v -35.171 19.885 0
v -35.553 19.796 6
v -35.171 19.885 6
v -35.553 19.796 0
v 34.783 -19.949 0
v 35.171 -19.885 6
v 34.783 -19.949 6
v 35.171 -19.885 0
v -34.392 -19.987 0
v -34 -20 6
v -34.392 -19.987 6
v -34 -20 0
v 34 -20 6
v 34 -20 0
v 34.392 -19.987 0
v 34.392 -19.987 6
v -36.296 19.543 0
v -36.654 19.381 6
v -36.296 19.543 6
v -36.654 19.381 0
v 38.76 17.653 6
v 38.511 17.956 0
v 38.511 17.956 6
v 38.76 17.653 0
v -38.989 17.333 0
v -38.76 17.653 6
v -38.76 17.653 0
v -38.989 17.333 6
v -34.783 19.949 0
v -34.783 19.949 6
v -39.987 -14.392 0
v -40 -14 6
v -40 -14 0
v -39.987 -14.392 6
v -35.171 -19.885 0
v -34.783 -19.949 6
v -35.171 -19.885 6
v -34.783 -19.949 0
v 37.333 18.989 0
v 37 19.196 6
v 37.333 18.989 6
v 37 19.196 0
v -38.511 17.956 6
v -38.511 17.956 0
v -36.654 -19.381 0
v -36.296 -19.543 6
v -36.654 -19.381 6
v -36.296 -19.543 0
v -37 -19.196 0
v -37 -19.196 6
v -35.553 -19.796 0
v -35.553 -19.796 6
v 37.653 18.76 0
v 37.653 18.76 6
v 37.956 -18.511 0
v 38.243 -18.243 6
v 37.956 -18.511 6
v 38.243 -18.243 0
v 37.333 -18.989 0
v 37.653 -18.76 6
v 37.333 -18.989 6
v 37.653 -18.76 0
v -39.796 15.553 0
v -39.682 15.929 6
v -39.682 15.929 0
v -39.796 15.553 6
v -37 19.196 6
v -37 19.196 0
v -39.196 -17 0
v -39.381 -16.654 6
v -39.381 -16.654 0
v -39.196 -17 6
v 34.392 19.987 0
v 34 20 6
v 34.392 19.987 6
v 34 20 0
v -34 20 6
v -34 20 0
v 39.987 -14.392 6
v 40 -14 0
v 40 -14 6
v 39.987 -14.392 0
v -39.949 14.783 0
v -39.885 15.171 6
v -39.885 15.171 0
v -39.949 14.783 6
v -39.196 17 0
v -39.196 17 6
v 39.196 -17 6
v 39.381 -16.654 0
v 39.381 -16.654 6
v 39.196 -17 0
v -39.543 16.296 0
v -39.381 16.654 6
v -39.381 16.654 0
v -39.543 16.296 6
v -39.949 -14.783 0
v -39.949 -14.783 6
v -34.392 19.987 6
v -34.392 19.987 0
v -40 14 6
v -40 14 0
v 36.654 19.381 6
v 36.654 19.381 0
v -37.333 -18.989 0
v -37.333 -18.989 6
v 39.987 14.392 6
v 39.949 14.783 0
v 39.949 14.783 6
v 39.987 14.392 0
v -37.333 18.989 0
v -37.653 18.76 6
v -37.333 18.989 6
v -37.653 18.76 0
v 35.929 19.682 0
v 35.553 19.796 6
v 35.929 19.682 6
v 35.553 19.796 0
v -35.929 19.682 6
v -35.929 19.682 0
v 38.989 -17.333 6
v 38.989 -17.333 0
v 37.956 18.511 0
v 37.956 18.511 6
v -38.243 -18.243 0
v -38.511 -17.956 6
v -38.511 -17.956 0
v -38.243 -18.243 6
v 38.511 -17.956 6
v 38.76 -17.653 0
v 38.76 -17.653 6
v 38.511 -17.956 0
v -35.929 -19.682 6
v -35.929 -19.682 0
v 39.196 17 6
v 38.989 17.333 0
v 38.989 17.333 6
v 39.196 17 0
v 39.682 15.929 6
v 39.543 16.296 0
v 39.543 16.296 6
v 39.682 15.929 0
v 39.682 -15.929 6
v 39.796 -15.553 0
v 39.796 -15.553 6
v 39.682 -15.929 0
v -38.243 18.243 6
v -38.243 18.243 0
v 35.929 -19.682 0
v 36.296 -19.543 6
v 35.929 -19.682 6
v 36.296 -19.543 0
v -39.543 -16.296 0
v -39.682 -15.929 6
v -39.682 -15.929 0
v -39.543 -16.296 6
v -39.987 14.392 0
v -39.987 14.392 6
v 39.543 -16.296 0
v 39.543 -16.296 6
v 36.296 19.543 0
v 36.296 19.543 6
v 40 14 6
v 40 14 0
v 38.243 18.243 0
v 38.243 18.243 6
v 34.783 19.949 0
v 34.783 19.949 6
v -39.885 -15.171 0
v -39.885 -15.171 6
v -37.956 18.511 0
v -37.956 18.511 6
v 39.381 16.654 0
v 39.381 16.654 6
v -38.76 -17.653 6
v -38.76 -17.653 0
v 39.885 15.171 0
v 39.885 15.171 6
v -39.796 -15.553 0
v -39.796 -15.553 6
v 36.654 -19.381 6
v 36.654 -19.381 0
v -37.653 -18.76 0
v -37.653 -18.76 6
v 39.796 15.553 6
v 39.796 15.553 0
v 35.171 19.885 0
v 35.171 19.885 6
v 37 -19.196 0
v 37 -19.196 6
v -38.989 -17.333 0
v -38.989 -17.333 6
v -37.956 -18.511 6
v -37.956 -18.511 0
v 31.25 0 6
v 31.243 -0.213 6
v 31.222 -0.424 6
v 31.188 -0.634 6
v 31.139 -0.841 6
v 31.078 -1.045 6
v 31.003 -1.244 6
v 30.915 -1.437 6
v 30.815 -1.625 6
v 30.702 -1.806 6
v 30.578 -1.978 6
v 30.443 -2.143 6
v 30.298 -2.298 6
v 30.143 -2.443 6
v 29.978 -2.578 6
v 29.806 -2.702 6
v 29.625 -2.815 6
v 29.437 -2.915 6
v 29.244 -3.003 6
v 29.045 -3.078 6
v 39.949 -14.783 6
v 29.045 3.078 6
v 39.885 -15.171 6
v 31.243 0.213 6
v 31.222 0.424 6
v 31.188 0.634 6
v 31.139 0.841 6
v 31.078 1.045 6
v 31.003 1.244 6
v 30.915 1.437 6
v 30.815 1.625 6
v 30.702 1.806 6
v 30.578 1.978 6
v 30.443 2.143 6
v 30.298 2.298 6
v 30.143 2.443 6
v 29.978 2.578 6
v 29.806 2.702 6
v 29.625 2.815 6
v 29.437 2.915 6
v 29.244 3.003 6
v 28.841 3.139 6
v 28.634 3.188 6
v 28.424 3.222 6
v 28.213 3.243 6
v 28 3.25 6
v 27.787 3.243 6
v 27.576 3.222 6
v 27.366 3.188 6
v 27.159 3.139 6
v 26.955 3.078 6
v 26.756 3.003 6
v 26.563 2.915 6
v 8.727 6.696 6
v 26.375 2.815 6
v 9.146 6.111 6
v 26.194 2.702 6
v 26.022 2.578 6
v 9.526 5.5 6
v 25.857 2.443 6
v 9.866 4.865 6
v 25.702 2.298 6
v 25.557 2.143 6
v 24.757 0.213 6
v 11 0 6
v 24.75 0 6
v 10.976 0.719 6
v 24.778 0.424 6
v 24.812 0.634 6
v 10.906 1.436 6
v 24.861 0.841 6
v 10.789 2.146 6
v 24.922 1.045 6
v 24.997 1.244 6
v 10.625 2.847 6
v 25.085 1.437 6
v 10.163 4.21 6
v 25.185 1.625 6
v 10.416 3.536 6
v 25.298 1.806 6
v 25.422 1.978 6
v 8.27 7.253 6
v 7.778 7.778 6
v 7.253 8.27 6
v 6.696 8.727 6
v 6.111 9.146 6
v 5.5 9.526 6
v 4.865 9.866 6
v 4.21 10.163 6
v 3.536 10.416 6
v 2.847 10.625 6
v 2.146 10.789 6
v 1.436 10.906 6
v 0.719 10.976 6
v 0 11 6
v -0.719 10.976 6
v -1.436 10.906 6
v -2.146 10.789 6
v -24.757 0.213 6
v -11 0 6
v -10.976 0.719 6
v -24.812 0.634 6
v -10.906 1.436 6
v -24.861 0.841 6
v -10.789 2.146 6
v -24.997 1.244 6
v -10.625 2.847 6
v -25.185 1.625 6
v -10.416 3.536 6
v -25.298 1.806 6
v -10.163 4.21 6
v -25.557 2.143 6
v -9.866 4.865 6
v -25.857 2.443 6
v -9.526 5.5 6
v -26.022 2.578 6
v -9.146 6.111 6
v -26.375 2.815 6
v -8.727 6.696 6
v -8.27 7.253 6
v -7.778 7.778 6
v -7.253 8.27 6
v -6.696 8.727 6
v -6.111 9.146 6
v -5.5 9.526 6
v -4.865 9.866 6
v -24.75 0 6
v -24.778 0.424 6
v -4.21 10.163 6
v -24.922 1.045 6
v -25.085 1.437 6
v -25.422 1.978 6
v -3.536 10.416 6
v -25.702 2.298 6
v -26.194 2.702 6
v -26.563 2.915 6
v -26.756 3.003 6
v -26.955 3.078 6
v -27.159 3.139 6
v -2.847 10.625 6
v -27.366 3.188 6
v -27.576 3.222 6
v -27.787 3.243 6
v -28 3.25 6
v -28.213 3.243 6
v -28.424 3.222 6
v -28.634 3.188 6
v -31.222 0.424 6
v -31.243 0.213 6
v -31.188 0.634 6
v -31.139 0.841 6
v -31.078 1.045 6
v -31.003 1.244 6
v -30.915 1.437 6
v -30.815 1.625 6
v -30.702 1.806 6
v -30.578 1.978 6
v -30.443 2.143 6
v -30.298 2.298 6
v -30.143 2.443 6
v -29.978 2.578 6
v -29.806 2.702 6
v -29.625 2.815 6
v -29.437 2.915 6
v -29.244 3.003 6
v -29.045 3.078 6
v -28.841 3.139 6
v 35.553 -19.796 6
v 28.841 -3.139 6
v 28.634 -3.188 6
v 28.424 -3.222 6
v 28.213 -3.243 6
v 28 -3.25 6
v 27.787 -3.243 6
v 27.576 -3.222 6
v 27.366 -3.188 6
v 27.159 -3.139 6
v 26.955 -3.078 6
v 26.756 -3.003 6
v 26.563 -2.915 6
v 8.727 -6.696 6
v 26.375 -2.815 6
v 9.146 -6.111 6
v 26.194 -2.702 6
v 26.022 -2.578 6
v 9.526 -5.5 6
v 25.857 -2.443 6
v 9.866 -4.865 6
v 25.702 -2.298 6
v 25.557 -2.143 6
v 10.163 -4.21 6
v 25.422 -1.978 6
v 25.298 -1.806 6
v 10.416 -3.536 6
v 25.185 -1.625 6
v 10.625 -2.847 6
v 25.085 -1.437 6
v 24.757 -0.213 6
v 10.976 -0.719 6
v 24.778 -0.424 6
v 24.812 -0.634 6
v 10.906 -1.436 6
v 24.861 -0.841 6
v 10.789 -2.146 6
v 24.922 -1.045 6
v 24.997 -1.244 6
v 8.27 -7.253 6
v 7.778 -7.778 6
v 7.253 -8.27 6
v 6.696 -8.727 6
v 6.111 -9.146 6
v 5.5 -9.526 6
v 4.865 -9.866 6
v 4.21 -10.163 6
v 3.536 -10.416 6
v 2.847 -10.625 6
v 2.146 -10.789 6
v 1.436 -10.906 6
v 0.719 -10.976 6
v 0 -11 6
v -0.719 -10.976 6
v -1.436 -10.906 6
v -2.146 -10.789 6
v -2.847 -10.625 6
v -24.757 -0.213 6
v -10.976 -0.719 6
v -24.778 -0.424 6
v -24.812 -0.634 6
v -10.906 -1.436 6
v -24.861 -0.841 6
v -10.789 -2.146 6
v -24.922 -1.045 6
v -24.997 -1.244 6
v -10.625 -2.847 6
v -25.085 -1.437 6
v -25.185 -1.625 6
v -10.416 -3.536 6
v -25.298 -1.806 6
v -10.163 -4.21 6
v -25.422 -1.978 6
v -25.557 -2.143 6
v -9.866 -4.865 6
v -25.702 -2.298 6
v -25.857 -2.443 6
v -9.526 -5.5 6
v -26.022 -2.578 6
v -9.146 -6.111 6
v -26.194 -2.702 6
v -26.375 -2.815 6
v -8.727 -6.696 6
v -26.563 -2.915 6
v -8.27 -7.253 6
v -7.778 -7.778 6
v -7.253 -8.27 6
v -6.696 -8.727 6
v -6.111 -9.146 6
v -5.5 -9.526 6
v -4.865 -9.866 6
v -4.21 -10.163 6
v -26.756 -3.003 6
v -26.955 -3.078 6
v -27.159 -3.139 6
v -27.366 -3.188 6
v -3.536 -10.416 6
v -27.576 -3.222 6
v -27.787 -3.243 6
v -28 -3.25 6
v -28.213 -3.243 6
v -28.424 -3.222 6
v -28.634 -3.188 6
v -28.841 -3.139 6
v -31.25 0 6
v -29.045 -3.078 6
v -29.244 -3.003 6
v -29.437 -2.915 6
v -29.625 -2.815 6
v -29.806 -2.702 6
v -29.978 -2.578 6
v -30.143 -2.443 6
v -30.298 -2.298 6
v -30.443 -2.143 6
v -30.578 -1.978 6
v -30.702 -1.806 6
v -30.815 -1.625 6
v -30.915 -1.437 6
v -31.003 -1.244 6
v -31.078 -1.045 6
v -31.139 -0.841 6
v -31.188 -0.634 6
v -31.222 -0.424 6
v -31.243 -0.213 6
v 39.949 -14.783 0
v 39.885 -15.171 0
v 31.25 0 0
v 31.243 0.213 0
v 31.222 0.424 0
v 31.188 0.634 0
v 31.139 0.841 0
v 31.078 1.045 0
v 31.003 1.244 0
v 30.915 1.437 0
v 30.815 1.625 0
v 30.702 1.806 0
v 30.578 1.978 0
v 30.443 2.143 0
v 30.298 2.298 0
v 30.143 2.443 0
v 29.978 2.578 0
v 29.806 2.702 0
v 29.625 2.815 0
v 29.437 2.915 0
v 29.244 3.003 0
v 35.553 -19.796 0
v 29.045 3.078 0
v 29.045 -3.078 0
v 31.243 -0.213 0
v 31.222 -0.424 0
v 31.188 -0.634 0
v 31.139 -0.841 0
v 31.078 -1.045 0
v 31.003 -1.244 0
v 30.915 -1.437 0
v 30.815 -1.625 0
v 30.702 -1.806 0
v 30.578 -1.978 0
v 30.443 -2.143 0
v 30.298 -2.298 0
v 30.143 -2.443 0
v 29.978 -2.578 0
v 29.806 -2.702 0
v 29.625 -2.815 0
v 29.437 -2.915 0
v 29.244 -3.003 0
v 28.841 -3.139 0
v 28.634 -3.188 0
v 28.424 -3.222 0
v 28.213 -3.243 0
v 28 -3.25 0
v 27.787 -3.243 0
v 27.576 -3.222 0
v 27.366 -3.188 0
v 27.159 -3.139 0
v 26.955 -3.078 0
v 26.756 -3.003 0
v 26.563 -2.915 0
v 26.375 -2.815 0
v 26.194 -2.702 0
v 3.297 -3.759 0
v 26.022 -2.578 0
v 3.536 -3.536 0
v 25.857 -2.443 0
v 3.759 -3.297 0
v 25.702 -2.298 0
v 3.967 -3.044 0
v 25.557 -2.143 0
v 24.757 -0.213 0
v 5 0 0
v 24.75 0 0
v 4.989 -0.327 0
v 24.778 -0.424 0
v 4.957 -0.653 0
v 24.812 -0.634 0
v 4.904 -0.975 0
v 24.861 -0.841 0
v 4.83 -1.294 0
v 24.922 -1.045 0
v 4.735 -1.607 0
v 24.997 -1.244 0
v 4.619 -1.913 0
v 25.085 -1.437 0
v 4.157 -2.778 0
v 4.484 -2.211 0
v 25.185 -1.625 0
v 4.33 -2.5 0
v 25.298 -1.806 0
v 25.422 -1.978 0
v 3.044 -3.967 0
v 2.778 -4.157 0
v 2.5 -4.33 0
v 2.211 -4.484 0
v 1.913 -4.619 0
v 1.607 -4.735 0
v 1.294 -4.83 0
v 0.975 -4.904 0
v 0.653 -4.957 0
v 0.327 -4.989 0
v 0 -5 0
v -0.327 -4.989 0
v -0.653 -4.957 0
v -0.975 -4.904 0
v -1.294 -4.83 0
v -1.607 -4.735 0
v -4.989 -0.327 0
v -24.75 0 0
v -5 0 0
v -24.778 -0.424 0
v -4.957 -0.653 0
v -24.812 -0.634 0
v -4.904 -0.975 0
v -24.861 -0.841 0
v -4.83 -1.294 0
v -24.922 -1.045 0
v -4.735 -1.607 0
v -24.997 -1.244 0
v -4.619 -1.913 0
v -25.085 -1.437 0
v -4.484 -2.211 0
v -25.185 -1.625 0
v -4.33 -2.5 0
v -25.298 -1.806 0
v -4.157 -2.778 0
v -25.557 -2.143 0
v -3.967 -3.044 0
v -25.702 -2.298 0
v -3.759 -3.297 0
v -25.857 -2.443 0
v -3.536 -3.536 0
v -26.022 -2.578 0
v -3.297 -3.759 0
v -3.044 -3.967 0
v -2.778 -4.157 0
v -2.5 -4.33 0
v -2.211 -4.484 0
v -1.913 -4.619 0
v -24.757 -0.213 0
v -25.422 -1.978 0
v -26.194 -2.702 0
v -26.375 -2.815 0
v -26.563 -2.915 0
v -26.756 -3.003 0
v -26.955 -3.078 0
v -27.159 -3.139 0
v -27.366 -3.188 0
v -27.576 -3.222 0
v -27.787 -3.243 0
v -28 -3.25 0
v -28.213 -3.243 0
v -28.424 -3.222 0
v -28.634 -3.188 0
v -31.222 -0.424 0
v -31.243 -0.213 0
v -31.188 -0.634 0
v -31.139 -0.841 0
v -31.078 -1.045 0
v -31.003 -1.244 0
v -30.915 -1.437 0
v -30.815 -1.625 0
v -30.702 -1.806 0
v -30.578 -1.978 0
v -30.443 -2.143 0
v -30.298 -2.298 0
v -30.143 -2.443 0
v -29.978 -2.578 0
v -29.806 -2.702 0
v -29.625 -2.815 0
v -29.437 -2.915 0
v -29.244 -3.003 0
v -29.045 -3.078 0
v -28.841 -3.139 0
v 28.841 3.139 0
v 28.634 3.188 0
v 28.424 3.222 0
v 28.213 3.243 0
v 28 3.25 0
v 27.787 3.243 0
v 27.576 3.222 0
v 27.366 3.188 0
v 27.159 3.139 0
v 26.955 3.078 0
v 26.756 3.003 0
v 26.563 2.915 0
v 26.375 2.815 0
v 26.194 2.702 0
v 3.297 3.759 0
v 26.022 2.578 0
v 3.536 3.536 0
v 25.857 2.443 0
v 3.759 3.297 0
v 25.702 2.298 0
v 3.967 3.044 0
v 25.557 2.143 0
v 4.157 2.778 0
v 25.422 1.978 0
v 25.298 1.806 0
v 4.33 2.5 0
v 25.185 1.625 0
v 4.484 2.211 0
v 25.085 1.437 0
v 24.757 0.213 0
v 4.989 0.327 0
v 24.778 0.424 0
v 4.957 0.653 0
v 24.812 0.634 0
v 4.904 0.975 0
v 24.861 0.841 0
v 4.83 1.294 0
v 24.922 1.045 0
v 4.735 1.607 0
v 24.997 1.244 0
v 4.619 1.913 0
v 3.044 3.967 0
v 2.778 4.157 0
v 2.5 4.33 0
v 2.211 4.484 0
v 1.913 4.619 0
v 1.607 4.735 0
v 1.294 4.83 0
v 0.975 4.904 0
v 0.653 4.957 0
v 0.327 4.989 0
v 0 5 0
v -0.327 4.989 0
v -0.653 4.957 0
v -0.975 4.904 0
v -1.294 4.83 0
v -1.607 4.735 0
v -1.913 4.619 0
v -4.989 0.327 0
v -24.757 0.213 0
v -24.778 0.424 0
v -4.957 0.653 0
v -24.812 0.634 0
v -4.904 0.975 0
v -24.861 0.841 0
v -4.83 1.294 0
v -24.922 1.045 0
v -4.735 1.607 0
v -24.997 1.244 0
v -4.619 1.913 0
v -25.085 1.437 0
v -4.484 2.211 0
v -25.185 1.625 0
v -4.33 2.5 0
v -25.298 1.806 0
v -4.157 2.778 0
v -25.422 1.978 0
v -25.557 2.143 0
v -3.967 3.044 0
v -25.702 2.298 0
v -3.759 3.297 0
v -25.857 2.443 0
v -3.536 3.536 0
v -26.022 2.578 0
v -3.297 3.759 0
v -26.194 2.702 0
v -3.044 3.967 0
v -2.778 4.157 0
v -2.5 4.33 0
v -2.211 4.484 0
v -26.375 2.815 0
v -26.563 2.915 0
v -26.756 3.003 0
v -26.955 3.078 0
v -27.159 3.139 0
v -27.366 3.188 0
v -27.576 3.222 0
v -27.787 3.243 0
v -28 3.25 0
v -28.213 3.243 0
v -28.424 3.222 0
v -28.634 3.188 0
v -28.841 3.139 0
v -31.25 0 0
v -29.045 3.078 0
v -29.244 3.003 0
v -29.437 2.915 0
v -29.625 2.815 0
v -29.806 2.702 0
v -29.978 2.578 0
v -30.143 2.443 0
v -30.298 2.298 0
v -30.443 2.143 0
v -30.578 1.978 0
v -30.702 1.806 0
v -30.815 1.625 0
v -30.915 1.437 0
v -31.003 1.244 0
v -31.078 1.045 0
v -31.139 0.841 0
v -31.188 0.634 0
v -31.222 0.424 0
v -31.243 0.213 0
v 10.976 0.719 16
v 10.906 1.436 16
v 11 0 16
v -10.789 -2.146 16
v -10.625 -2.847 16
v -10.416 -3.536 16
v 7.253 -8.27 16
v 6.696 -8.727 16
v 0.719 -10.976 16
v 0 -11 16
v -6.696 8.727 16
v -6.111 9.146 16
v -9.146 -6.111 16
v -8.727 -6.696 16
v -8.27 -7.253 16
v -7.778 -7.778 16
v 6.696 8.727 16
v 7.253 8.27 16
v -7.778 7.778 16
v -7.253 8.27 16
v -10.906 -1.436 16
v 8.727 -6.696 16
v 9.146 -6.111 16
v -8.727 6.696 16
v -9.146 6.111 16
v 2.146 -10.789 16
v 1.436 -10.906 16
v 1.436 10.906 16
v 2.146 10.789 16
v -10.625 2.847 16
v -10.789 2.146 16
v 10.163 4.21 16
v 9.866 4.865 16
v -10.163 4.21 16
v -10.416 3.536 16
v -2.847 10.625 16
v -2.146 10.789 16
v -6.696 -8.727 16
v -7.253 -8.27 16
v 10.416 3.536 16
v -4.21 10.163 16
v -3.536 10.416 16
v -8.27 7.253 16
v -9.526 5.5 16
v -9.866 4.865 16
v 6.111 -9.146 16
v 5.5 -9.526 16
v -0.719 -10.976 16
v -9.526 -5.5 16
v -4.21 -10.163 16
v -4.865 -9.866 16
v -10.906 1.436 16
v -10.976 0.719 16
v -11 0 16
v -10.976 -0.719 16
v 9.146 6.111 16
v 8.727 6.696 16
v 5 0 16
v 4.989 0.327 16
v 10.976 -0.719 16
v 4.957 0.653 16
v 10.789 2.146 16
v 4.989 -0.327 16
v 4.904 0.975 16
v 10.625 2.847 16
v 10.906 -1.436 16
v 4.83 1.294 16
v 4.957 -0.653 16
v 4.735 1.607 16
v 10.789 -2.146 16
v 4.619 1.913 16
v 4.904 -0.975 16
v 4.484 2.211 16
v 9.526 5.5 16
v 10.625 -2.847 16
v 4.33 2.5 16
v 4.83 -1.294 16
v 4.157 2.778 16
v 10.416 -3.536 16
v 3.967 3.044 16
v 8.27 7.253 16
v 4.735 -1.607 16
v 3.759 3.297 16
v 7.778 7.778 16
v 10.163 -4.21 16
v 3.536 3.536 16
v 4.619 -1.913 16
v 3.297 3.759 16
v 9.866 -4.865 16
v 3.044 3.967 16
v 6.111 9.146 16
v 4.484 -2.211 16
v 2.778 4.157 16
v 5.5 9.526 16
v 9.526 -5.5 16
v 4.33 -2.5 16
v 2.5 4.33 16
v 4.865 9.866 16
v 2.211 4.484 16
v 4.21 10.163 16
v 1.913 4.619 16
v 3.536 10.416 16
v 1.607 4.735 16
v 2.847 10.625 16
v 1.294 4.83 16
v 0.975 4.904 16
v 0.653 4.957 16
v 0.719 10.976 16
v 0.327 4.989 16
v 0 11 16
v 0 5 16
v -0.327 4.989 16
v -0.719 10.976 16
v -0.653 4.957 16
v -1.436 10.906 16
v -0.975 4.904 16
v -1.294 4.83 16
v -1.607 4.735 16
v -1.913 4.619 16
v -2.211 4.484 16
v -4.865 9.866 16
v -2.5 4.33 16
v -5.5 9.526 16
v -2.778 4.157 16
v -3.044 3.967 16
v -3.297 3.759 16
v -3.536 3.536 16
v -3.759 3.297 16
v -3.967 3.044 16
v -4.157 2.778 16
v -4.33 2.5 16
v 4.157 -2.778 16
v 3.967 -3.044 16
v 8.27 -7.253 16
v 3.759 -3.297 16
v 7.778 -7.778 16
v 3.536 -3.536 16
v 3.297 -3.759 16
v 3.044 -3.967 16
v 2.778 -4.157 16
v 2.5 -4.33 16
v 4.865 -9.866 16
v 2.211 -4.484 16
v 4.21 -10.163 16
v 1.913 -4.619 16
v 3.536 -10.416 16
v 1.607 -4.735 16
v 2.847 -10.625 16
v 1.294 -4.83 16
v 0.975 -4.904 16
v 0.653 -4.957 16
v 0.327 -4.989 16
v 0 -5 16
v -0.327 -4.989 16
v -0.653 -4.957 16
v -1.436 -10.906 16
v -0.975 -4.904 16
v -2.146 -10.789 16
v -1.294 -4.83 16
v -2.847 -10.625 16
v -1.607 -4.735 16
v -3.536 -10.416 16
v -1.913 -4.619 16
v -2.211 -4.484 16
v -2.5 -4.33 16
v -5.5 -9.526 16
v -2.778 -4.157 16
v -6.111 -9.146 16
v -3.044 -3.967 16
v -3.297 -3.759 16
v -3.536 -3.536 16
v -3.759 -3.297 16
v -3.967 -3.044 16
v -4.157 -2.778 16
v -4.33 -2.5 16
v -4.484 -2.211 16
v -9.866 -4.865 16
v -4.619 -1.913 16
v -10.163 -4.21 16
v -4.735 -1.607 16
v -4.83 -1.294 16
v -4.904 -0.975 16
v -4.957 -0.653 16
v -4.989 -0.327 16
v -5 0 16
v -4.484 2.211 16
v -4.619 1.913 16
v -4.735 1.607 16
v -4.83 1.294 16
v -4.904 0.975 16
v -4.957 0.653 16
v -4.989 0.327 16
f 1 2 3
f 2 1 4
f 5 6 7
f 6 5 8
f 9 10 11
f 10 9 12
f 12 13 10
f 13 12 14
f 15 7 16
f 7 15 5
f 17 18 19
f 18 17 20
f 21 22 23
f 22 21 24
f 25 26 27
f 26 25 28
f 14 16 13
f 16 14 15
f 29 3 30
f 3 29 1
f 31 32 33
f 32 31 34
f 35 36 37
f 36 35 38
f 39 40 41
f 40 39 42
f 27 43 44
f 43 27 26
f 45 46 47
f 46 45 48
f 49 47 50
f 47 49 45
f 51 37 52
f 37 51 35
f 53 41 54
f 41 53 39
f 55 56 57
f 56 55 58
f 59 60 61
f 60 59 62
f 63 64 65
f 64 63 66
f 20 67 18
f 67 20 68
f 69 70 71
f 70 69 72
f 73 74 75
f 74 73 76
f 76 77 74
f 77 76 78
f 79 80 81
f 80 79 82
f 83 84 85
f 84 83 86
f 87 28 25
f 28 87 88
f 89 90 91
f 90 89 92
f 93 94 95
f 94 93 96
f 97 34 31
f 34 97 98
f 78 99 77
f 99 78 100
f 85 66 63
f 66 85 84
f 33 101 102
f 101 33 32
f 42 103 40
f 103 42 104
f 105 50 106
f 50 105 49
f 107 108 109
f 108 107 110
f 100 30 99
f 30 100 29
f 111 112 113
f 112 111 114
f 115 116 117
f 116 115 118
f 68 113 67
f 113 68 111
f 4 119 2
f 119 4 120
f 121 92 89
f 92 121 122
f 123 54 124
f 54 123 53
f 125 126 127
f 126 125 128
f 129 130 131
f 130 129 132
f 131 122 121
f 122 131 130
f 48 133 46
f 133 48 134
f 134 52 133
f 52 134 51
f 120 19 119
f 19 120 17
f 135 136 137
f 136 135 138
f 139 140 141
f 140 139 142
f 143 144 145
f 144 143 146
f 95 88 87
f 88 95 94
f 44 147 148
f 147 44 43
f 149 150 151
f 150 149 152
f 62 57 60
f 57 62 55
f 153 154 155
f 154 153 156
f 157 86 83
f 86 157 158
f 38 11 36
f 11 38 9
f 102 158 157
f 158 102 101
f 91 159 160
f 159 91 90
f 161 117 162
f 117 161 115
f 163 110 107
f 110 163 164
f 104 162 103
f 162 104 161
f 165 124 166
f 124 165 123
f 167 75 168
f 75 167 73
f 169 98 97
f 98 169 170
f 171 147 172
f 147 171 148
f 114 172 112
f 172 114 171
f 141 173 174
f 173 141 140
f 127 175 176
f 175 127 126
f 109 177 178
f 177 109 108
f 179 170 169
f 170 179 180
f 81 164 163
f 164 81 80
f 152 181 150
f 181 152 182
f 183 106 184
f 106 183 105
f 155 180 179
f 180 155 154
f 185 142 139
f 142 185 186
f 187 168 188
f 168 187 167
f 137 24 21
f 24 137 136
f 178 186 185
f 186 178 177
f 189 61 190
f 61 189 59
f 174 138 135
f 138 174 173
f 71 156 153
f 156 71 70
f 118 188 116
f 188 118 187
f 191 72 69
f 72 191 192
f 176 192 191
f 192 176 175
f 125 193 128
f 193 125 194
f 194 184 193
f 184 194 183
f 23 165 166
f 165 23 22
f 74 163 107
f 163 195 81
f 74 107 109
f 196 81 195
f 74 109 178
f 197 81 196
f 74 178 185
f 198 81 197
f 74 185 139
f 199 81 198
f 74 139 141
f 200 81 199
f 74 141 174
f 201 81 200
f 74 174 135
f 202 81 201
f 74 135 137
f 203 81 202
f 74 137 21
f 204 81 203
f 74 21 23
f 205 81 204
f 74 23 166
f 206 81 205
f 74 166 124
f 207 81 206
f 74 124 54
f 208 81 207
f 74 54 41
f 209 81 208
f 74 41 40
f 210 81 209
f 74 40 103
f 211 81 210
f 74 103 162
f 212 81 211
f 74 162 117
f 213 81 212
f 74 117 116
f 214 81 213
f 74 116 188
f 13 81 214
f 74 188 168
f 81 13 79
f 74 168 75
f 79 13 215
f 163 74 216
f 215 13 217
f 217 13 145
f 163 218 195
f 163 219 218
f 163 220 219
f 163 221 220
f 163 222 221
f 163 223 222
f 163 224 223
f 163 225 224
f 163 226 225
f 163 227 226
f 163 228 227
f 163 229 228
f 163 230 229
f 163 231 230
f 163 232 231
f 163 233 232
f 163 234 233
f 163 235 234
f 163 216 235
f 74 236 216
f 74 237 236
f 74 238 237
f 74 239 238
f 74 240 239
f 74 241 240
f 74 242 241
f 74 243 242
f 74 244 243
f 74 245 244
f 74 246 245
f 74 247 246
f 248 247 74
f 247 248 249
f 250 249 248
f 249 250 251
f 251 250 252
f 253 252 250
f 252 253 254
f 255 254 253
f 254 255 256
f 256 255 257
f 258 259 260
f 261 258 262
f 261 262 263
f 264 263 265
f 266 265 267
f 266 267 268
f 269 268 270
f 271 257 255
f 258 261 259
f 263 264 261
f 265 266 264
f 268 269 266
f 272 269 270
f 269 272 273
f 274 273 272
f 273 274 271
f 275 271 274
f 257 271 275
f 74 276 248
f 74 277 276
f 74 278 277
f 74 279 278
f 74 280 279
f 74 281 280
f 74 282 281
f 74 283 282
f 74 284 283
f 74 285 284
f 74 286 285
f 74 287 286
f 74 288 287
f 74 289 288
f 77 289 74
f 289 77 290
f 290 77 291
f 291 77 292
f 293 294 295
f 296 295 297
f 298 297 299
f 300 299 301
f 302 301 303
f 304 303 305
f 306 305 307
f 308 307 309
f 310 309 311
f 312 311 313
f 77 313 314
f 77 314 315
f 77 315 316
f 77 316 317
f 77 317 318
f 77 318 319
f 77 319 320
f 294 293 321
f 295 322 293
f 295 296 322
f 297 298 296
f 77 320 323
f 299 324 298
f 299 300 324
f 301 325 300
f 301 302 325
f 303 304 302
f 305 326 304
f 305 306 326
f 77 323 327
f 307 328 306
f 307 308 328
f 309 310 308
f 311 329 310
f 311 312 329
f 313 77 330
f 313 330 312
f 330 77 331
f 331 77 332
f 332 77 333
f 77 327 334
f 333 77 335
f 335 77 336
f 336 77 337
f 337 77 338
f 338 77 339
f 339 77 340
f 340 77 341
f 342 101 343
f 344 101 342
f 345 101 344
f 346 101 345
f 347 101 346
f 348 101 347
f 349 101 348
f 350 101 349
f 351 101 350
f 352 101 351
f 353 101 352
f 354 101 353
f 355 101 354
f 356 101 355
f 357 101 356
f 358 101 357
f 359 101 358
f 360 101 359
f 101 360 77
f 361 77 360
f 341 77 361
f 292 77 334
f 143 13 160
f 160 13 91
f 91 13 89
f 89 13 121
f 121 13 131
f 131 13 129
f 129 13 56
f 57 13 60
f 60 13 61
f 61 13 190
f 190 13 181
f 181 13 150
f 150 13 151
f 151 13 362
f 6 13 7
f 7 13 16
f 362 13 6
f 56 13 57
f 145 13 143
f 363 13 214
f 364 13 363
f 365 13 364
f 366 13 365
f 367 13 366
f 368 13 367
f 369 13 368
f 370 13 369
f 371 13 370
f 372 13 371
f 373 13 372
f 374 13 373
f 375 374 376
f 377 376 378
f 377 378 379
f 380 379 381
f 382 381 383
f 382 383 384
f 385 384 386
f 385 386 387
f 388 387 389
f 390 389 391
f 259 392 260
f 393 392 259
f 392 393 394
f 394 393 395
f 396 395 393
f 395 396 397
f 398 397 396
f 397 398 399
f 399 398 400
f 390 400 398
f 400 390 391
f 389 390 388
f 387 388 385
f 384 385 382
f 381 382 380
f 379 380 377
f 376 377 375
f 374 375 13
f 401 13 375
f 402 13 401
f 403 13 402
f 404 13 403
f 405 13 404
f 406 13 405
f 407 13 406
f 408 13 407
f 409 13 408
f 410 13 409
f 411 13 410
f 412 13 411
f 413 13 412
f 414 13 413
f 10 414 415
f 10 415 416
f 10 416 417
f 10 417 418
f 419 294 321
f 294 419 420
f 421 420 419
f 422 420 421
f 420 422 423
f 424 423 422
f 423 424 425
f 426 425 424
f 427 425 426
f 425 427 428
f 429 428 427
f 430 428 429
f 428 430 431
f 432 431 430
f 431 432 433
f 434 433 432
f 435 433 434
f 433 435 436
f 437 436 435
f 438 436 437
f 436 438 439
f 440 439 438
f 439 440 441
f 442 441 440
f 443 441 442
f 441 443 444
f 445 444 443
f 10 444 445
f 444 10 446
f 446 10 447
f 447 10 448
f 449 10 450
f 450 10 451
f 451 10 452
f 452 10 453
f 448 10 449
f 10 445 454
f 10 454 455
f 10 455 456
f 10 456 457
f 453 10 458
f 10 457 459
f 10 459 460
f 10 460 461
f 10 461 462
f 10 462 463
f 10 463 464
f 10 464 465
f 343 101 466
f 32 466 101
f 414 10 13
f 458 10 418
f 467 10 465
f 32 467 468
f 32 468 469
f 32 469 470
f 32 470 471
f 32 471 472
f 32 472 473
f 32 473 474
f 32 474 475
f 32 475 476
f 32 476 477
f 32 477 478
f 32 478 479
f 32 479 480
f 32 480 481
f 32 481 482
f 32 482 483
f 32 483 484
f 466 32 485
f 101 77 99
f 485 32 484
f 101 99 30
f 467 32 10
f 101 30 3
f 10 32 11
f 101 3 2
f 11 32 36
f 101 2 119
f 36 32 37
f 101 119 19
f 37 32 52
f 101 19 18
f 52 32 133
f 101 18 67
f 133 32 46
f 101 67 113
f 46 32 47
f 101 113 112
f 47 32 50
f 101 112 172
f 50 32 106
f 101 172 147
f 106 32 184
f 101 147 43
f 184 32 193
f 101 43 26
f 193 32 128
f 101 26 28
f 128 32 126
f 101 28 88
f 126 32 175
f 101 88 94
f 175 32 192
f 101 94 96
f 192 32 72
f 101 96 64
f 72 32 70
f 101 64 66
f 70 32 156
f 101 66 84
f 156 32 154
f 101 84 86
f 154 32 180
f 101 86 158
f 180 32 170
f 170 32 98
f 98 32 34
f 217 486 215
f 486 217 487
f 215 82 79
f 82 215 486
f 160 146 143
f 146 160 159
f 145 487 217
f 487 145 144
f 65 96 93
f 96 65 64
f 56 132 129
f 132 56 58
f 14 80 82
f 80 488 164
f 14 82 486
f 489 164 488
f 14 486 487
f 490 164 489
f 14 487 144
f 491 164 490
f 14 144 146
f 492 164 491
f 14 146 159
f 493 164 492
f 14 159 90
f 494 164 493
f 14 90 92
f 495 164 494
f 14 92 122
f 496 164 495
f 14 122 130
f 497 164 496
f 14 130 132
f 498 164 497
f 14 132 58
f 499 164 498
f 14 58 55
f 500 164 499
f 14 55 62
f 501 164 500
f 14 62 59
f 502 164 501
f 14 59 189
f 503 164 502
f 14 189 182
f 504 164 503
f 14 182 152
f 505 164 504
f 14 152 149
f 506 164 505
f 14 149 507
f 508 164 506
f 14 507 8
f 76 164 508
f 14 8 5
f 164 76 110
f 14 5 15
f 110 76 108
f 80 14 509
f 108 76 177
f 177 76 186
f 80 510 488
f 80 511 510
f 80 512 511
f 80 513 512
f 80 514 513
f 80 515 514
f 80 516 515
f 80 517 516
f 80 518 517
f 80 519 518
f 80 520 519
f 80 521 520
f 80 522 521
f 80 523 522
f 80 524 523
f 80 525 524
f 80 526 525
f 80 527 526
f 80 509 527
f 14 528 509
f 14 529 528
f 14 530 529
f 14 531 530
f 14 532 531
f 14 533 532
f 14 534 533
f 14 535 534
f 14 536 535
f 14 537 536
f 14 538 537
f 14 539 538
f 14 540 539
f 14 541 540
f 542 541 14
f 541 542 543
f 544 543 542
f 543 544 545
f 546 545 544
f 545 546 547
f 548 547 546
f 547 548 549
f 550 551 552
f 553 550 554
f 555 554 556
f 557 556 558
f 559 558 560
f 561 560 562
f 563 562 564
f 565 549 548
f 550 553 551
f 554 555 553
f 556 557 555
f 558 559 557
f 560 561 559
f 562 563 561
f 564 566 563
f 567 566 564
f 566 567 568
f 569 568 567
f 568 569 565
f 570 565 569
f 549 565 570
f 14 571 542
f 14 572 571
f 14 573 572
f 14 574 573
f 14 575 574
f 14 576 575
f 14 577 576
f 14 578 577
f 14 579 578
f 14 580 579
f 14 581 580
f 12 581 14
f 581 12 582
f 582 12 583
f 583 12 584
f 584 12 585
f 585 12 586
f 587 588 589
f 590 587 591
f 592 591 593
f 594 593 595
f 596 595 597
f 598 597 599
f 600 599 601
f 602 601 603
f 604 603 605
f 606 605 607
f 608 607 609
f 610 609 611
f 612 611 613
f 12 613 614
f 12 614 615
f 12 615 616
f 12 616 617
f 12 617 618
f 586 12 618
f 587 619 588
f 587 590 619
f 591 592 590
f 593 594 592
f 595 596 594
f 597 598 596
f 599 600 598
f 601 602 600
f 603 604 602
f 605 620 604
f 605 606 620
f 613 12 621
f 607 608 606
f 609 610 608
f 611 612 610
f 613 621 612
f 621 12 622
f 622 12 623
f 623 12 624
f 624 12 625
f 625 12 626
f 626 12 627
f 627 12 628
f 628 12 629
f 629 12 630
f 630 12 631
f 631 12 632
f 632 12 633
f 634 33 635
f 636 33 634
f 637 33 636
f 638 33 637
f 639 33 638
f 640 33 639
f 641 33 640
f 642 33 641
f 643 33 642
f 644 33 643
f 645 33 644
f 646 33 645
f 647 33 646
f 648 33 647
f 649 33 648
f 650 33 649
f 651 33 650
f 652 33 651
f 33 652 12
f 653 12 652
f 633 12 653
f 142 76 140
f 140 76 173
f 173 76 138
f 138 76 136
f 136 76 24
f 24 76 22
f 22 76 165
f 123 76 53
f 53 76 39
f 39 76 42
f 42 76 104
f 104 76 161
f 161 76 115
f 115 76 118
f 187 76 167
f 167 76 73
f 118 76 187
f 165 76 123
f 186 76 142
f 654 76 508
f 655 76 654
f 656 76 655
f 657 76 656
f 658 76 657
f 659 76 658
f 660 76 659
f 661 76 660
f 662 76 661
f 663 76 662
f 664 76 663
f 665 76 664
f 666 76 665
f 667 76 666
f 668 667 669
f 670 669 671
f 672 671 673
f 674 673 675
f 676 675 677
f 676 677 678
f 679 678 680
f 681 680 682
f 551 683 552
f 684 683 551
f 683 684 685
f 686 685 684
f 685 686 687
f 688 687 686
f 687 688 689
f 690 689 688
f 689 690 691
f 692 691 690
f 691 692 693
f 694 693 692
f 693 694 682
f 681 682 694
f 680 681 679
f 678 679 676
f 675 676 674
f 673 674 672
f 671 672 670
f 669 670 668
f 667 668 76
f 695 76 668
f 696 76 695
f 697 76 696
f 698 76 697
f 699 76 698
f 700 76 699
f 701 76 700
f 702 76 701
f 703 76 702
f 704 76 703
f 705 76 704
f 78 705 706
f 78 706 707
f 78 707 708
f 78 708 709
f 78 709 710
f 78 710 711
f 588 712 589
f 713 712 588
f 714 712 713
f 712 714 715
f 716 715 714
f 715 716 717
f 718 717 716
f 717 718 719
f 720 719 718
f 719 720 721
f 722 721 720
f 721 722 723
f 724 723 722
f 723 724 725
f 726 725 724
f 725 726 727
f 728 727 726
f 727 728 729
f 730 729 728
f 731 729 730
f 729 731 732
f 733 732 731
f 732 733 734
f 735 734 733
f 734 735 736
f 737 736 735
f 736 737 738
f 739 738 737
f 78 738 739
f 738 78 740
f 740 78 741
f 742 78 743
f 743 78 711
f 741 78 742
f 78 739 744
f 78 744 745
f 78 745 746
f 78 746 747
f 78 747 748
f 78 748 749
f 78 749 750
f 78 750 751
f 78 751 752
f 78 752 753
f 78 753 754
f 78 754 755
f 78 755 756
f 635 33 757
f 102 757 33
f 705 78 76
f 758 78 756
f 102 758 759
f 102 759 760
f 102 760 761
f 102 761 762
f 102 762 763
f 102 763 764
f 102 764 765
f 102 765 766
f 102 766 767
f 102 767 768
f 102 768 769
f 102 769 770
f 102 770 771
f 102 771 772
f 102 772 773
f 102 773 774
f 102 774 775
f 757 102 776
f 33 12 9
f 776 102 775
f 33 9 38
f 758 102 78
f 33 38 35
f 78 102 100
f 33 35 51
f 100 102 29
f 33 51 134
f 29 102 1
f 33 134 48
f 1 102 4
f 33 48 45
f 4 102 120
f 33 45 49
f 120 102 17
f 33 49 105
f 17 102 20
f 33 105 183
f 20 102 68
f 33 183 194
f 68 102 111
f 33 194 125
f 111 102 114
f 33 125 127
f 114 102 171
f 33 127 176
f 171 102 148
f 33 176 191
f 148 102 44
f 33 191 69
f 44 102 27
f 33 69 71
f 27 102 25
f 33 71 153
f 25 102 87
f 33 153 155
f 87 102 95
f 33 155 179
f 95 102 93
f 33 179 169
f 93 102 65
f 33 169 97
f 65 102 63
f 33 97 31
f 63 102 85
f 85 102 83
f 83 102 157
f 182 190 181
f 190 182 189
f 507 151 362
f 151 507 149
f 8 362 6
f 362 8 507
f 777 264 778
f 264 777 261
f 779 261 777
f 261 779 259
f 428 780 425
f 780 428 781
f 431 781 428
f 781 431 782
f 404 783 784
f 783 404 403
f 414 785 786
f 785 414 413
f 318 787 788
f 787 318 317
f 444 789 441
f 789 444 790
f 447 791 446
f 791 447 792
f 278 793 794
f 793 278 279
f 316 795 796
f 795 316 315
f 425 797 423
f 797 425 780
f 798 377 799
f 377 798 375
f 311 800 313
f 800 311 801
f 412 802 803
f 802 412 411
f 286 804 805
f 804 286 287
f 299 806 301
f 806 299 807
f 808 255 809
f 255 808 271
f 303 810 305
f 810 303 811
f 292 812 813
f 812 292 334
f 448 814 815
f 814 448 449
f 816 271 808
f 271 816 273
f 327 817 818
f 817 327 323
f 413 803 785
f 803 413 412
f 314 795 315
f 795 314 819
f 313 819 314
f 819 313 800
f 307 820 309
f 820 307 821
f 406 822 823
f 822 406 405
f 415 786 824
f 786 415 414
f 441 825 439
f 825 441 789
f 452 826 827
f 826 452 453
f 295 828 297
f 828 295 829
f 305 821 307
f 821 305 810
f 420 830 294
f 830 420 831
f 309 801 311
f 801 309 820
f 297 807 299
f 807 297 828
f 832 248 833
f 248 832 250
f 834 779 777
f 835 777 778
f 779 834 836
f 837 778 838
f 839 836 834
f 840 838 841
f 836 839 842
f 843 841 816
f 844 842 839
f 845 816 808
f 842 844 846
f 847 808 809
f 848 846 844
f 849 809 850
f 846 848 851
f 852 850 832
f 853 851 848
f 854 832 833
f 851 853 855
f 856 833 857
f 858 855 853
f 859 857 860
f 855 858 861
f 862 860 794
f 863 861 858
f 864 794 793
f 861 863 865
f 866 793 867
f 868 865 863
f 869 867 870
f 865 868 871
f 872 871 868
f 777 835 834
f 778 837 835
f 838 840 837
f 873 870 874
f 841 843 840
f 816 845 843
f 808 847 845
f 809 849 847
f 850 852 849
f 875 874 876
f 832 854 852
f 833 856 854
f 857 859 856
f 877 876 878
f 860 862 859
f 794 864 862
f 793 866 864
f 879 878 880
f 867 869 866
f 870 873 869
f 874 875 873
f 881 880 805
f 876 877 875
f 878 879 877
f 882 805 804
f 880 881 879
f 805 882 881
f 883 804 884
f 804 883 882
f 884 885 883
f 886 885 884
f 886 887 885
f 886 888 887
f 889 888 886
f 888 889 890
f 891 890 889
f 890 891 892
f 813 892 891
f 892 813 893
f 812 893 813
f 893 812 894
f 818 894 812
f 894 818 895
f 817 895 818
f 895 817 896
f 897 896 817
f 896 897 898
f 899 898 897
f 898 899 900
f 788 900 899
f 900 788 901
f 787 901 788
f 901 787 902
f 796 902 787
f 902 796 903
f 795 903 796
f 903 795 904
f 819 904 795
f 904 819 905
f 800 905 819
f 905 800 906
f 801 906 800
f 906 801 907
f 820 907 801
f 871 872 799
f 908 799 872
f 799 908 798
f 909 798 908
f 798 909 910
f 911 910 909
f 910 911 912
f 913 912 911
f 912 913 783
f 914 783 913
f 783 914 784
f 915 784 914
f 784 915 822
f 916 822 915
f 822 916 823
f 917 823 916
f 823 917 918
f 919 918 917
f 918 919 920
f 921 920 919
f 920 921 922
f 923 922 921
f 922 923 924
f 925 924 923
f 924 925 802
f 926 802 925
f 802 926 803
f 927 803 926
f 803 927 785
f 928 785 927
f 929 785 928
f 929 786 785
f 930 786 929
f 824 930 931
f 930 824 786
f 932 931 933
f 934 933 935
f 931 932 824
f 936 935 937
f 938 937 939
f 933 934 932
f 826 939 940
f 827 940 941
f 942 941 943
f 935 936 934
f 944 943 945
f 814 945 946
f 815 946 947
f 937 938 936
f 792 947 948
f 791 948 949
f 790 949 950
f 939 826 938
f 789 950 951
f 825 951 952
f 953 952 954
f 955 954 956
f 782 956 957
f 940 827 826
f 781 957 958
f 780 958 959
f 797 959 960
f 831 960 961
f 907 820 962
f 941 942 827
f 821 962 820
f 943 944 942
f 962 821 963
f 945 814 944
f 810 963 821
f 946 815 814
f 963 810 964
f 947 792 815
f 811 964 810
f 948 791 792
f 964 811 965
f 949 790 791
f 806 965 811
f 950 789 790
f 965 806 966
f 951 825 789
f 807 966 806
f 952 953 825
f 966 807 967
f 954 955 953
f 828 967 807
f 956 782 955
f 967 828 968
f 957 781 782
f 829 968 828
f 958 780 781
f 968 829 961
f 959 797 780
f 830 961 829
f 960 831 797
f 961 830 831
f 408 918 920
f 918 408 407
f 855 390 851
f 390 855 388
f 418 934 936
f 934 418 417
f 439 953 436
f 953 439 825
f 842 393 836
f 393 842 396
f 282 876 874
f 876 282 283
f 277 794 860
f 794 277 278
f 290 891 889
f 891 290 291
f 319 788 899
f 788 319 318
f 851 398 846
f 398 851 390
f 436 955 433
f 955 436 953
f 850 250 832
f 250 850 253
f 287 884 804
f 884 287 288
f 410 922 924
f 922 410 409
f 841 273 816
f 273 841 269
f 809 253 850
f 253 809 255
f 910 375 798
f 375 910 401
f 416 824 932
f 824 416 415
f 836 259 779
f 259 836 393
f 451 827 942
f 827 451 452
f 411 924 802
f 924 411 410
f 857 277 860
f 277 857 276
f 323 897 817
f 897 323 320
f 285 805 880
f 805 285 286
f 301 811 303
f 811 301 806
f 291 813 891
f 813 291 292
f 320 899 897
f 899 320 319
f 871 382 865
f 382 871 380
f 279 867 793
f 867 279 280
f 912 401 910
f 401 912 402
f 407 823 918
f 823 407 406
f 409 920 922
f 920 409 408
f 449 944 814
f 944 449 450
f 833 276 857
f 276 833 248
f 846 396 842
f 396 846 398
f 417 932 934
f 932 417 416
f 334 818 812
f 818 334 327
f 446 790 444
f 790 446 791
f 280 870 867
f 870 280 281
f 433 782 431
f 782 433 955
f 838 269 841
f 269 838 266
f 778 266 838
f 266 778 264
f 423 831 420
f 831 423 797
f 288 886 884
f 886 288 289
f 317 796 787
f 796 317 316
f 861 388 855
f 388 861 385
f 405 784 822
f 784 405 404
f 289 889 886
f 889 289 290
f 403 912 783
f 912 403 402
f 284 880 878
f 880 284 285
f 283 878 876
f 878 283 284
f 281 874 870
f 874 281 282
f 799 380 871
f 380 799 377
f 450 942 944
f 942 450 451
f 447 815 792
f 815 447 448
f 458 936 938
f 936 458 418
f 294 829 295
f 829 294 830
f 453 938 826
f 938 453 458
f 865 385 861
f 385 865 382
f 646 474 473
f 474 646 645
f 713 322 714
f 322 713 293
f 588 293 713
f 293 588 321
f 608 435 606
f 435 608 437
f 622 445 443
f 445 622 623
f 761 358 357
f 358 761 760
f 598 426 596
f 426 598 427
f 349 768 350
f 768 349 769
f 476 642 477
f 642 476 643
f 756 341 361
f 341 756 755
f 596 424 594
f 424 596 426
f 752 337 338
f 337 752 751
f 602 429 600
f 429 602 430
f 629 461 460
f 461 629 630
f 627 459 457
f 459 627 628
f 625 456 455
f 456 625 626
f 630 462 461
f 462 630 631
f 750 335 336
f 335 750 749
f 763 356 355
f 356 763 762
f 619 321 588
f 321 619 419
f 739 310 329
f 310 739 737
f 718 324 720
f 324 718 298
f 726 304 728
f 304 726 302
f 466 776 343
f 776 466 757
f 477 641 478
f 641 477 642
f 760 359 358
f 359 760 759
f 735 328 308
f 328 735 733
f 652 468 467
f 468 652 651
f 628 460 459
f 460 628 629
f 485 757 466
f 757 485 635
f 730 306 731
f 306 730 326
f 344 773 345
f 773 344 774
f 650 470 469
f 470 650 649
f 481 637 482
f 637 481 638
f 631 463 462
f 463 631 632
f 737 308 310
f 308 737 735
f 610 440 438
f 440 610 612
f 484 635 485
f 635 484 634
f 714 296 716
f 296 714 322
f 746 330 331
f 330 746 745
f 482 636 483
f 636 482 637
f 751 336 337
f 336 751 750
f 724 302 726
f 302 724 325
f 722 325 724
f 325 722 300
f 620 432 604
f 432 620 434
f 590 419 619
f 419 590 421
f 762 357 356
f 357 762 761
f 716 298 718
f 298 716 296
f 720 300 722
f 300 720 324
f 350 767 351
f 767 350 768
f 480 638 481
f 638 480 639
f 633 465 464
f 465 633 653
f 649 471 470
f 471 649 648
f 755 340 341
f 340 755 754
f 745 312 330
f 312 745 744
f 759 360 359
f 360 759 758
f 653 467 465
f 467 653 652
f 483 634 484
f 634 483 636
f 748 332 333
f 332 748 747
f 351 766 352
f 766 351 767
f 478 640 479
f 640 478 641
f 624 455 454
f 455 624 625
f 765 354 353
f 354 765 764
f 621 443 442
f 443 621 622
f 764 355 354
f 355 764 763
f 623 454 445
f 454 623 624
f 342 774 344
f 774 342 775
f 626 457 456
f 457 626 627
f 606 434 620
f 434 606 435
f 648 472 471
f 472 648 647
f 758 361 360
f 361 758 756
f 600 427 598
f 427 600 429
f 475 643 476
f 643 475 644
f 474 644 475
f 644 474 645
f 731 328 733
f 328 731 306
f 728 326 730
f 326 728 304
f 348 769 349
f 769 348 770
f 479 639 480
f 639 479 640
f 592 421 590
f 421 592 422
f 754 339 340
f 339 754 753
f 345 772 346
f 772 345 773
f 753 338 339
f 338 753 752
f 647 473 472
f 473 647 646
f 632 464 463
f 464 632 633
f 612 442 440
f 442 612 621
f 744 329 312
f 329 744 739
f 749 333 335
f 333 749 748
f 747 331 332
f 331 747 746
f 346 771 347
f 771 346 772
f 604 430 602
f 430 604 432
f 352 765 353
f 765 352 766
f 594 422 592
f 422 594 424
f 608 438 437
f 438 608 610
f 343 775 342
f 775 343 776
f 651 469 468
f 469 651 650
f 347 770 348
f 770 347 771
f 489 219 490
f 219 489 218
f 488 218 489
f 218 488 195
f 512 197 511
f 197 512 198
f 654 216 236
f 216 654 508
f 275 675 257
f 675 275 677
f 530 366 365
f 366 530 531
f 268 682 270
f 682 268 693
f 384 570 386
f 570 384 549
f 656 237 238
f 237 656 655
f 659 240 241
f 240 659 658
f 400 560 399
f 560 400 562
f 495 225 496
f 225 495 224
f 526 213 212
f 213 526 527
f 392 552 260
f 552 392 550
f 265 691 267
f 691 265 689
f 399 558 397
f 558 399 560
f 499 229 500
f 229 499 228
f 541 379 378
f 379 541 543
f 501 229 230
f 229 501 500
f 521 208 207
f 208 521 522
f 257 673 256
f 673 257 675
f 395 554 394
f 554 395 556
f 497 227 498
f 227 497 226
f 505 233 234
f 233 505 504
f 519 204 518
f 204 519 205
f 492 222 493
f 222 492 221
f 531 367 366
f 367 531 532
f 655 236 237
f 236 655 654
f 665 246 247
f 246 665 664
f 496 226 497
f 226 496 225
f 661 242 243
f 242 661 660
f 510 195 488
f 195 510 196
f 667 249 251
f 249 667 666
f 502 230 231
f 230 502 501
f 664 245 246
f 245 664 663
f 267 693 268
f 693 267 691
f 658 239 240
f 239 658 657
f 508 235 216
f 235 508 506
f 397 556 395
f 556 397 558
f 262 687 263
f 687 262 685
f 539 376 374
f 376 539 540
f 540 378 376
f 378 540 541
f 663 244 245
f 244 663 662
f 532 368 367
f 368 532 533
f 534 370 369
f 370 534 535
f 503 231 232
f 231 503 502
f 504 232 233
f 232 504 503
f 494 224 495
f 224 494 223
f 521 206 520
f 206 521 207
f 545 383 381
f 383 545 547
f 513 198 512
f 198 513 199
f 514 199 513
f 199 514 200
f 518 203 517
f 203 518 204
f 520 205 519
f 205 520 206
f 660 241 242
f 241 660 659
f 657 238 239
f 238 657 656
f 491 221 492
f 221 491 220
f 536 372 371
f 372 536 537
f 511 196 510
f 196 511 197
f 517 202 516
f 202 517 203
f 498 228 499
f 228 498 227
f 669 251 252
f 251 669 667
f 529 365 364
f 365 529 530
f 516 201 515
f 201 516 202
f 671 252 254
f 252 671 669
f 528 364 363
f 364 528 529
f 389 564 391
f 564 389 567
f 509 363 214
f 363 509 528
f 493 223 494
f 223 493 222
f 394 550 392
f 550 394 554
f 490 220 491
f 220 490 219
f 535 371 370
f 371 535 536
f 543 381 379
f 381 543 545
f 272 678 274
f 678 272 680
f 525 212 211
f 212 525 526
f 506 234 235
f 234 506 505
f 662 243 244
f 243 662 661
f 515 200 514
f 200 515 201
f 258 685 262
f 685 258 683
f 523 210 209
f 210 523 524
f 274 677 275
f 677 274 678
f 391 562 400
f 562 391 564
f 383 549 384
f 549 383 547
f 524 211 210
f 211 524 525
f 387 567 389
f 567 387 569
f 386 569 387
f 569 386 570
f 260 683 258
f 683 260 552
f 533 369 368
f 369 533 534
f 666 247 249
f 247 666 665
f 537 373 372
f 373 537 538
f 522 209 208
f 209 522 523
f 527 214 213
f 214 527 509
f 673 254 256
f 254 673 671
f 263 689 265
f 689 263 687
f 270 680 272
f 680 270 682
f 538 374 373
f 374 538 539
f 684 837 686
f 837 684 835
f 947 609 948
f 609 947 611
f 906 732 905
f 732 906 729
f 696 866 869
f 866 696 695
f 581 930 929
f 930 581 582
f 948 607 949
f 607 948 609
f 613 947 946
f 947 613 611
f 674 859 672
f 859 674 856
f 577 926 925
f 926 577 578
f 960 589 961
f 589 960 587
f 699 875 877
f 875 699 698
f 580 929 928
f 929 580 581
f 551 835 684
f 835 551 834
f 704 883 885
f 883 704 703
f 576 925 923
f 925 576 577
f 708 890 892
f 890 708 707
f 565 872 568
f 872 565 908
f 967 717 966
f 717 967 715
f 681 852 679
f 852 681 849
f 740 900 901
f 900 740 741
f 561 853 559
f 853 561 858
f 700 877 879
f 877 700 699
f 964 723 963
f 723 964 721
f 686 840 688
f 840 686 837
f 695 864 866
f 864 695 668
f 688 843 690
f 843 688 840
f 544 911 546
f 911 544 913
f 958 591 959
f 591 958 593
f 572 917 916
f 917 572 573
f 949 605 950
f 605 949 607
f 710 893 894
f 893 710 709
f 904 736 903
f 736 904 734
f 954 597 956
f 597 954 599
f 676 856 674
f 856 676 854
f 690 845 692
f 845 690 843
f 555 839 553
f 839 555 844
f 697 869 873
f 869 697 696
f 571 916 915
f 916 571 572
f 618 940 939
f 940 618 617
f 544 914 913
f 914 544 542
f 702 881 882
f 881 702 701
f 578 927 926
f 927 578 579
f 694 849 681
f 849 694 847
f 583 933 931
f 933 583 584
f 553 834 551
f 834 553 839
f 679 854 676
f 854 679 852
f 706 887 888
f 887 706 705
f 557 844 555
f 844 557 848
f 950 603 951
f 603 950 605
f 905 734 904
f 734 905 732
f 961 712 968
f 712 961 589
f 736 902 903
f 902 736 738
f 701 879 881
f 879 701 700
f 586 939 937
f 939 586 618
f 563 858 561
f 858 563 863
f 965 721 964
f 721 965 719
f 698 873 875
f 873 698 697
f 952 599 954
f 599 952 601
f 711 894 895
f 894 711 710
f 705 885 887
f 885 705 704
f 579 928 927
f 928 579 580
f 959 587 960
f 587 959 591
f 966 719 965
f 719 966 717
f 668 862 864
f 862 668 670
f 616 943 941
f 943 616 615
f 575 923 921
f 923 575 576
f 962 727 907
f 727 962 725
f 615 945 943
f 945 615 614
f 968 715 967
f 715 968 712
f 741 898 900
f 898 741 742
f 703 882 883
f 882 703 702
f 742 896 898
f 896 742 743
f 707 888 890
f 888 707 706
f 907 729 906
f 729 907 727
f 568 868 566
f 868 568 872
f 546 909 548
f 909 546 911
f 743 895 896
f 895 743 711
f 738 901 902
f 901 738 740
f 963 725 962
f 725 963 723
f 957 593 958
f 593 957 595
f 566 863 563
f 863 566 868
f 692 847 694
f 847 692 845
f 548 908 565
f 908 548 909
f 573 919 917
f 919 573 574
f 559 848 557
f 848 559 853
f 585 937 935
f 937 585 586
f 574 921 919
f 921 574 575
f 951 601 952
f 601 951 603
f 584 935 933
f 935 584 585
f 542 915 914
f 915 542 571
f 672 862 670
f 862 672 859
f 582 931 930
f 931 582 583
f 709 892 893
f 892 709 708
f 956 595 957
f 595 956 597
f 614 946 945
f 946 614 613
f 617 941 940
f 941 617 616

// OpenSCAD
$fn=96;

// Basic parametric component (mounting plate with two holes and a central boss)
plate_len = 80;
plate_wid = 40;
plate_thk = 6;

corner_r = 6;

hole_d = 6.5;
hole_edge_offset = 12;

boss_d = 22;
boss_h = 10;

center_hole_d = 10;

module rounded_plate(l, w, t, r){
    linear_extrude(height=t)
        offset(r=r)
            square([l-2*r, w-2*r], center=true);
}

difference(){
    union(){
        // Plate
        rounded_plate(plate_len, plate_wid, plate_thk, corner_r);

        // Central boss
        translate([0,0,plate_thk])
            cylinder(d=boss_d, h=boss_h);
    }

    // Two mounting holes through plate
    for (x = [-plate_len/2 + hole_edge_offset, plate_len/2 - hole_edge_offset])
        translate([x, 0, -1])
            cylinder(d=hole_d, h=plate_thk + boss_h + 2);

    // Center hole through boss and plate
    translate([0,0,-1])
        cylinder(d=center_hole_d, h=plate_thk + boss_h + 2);
}
